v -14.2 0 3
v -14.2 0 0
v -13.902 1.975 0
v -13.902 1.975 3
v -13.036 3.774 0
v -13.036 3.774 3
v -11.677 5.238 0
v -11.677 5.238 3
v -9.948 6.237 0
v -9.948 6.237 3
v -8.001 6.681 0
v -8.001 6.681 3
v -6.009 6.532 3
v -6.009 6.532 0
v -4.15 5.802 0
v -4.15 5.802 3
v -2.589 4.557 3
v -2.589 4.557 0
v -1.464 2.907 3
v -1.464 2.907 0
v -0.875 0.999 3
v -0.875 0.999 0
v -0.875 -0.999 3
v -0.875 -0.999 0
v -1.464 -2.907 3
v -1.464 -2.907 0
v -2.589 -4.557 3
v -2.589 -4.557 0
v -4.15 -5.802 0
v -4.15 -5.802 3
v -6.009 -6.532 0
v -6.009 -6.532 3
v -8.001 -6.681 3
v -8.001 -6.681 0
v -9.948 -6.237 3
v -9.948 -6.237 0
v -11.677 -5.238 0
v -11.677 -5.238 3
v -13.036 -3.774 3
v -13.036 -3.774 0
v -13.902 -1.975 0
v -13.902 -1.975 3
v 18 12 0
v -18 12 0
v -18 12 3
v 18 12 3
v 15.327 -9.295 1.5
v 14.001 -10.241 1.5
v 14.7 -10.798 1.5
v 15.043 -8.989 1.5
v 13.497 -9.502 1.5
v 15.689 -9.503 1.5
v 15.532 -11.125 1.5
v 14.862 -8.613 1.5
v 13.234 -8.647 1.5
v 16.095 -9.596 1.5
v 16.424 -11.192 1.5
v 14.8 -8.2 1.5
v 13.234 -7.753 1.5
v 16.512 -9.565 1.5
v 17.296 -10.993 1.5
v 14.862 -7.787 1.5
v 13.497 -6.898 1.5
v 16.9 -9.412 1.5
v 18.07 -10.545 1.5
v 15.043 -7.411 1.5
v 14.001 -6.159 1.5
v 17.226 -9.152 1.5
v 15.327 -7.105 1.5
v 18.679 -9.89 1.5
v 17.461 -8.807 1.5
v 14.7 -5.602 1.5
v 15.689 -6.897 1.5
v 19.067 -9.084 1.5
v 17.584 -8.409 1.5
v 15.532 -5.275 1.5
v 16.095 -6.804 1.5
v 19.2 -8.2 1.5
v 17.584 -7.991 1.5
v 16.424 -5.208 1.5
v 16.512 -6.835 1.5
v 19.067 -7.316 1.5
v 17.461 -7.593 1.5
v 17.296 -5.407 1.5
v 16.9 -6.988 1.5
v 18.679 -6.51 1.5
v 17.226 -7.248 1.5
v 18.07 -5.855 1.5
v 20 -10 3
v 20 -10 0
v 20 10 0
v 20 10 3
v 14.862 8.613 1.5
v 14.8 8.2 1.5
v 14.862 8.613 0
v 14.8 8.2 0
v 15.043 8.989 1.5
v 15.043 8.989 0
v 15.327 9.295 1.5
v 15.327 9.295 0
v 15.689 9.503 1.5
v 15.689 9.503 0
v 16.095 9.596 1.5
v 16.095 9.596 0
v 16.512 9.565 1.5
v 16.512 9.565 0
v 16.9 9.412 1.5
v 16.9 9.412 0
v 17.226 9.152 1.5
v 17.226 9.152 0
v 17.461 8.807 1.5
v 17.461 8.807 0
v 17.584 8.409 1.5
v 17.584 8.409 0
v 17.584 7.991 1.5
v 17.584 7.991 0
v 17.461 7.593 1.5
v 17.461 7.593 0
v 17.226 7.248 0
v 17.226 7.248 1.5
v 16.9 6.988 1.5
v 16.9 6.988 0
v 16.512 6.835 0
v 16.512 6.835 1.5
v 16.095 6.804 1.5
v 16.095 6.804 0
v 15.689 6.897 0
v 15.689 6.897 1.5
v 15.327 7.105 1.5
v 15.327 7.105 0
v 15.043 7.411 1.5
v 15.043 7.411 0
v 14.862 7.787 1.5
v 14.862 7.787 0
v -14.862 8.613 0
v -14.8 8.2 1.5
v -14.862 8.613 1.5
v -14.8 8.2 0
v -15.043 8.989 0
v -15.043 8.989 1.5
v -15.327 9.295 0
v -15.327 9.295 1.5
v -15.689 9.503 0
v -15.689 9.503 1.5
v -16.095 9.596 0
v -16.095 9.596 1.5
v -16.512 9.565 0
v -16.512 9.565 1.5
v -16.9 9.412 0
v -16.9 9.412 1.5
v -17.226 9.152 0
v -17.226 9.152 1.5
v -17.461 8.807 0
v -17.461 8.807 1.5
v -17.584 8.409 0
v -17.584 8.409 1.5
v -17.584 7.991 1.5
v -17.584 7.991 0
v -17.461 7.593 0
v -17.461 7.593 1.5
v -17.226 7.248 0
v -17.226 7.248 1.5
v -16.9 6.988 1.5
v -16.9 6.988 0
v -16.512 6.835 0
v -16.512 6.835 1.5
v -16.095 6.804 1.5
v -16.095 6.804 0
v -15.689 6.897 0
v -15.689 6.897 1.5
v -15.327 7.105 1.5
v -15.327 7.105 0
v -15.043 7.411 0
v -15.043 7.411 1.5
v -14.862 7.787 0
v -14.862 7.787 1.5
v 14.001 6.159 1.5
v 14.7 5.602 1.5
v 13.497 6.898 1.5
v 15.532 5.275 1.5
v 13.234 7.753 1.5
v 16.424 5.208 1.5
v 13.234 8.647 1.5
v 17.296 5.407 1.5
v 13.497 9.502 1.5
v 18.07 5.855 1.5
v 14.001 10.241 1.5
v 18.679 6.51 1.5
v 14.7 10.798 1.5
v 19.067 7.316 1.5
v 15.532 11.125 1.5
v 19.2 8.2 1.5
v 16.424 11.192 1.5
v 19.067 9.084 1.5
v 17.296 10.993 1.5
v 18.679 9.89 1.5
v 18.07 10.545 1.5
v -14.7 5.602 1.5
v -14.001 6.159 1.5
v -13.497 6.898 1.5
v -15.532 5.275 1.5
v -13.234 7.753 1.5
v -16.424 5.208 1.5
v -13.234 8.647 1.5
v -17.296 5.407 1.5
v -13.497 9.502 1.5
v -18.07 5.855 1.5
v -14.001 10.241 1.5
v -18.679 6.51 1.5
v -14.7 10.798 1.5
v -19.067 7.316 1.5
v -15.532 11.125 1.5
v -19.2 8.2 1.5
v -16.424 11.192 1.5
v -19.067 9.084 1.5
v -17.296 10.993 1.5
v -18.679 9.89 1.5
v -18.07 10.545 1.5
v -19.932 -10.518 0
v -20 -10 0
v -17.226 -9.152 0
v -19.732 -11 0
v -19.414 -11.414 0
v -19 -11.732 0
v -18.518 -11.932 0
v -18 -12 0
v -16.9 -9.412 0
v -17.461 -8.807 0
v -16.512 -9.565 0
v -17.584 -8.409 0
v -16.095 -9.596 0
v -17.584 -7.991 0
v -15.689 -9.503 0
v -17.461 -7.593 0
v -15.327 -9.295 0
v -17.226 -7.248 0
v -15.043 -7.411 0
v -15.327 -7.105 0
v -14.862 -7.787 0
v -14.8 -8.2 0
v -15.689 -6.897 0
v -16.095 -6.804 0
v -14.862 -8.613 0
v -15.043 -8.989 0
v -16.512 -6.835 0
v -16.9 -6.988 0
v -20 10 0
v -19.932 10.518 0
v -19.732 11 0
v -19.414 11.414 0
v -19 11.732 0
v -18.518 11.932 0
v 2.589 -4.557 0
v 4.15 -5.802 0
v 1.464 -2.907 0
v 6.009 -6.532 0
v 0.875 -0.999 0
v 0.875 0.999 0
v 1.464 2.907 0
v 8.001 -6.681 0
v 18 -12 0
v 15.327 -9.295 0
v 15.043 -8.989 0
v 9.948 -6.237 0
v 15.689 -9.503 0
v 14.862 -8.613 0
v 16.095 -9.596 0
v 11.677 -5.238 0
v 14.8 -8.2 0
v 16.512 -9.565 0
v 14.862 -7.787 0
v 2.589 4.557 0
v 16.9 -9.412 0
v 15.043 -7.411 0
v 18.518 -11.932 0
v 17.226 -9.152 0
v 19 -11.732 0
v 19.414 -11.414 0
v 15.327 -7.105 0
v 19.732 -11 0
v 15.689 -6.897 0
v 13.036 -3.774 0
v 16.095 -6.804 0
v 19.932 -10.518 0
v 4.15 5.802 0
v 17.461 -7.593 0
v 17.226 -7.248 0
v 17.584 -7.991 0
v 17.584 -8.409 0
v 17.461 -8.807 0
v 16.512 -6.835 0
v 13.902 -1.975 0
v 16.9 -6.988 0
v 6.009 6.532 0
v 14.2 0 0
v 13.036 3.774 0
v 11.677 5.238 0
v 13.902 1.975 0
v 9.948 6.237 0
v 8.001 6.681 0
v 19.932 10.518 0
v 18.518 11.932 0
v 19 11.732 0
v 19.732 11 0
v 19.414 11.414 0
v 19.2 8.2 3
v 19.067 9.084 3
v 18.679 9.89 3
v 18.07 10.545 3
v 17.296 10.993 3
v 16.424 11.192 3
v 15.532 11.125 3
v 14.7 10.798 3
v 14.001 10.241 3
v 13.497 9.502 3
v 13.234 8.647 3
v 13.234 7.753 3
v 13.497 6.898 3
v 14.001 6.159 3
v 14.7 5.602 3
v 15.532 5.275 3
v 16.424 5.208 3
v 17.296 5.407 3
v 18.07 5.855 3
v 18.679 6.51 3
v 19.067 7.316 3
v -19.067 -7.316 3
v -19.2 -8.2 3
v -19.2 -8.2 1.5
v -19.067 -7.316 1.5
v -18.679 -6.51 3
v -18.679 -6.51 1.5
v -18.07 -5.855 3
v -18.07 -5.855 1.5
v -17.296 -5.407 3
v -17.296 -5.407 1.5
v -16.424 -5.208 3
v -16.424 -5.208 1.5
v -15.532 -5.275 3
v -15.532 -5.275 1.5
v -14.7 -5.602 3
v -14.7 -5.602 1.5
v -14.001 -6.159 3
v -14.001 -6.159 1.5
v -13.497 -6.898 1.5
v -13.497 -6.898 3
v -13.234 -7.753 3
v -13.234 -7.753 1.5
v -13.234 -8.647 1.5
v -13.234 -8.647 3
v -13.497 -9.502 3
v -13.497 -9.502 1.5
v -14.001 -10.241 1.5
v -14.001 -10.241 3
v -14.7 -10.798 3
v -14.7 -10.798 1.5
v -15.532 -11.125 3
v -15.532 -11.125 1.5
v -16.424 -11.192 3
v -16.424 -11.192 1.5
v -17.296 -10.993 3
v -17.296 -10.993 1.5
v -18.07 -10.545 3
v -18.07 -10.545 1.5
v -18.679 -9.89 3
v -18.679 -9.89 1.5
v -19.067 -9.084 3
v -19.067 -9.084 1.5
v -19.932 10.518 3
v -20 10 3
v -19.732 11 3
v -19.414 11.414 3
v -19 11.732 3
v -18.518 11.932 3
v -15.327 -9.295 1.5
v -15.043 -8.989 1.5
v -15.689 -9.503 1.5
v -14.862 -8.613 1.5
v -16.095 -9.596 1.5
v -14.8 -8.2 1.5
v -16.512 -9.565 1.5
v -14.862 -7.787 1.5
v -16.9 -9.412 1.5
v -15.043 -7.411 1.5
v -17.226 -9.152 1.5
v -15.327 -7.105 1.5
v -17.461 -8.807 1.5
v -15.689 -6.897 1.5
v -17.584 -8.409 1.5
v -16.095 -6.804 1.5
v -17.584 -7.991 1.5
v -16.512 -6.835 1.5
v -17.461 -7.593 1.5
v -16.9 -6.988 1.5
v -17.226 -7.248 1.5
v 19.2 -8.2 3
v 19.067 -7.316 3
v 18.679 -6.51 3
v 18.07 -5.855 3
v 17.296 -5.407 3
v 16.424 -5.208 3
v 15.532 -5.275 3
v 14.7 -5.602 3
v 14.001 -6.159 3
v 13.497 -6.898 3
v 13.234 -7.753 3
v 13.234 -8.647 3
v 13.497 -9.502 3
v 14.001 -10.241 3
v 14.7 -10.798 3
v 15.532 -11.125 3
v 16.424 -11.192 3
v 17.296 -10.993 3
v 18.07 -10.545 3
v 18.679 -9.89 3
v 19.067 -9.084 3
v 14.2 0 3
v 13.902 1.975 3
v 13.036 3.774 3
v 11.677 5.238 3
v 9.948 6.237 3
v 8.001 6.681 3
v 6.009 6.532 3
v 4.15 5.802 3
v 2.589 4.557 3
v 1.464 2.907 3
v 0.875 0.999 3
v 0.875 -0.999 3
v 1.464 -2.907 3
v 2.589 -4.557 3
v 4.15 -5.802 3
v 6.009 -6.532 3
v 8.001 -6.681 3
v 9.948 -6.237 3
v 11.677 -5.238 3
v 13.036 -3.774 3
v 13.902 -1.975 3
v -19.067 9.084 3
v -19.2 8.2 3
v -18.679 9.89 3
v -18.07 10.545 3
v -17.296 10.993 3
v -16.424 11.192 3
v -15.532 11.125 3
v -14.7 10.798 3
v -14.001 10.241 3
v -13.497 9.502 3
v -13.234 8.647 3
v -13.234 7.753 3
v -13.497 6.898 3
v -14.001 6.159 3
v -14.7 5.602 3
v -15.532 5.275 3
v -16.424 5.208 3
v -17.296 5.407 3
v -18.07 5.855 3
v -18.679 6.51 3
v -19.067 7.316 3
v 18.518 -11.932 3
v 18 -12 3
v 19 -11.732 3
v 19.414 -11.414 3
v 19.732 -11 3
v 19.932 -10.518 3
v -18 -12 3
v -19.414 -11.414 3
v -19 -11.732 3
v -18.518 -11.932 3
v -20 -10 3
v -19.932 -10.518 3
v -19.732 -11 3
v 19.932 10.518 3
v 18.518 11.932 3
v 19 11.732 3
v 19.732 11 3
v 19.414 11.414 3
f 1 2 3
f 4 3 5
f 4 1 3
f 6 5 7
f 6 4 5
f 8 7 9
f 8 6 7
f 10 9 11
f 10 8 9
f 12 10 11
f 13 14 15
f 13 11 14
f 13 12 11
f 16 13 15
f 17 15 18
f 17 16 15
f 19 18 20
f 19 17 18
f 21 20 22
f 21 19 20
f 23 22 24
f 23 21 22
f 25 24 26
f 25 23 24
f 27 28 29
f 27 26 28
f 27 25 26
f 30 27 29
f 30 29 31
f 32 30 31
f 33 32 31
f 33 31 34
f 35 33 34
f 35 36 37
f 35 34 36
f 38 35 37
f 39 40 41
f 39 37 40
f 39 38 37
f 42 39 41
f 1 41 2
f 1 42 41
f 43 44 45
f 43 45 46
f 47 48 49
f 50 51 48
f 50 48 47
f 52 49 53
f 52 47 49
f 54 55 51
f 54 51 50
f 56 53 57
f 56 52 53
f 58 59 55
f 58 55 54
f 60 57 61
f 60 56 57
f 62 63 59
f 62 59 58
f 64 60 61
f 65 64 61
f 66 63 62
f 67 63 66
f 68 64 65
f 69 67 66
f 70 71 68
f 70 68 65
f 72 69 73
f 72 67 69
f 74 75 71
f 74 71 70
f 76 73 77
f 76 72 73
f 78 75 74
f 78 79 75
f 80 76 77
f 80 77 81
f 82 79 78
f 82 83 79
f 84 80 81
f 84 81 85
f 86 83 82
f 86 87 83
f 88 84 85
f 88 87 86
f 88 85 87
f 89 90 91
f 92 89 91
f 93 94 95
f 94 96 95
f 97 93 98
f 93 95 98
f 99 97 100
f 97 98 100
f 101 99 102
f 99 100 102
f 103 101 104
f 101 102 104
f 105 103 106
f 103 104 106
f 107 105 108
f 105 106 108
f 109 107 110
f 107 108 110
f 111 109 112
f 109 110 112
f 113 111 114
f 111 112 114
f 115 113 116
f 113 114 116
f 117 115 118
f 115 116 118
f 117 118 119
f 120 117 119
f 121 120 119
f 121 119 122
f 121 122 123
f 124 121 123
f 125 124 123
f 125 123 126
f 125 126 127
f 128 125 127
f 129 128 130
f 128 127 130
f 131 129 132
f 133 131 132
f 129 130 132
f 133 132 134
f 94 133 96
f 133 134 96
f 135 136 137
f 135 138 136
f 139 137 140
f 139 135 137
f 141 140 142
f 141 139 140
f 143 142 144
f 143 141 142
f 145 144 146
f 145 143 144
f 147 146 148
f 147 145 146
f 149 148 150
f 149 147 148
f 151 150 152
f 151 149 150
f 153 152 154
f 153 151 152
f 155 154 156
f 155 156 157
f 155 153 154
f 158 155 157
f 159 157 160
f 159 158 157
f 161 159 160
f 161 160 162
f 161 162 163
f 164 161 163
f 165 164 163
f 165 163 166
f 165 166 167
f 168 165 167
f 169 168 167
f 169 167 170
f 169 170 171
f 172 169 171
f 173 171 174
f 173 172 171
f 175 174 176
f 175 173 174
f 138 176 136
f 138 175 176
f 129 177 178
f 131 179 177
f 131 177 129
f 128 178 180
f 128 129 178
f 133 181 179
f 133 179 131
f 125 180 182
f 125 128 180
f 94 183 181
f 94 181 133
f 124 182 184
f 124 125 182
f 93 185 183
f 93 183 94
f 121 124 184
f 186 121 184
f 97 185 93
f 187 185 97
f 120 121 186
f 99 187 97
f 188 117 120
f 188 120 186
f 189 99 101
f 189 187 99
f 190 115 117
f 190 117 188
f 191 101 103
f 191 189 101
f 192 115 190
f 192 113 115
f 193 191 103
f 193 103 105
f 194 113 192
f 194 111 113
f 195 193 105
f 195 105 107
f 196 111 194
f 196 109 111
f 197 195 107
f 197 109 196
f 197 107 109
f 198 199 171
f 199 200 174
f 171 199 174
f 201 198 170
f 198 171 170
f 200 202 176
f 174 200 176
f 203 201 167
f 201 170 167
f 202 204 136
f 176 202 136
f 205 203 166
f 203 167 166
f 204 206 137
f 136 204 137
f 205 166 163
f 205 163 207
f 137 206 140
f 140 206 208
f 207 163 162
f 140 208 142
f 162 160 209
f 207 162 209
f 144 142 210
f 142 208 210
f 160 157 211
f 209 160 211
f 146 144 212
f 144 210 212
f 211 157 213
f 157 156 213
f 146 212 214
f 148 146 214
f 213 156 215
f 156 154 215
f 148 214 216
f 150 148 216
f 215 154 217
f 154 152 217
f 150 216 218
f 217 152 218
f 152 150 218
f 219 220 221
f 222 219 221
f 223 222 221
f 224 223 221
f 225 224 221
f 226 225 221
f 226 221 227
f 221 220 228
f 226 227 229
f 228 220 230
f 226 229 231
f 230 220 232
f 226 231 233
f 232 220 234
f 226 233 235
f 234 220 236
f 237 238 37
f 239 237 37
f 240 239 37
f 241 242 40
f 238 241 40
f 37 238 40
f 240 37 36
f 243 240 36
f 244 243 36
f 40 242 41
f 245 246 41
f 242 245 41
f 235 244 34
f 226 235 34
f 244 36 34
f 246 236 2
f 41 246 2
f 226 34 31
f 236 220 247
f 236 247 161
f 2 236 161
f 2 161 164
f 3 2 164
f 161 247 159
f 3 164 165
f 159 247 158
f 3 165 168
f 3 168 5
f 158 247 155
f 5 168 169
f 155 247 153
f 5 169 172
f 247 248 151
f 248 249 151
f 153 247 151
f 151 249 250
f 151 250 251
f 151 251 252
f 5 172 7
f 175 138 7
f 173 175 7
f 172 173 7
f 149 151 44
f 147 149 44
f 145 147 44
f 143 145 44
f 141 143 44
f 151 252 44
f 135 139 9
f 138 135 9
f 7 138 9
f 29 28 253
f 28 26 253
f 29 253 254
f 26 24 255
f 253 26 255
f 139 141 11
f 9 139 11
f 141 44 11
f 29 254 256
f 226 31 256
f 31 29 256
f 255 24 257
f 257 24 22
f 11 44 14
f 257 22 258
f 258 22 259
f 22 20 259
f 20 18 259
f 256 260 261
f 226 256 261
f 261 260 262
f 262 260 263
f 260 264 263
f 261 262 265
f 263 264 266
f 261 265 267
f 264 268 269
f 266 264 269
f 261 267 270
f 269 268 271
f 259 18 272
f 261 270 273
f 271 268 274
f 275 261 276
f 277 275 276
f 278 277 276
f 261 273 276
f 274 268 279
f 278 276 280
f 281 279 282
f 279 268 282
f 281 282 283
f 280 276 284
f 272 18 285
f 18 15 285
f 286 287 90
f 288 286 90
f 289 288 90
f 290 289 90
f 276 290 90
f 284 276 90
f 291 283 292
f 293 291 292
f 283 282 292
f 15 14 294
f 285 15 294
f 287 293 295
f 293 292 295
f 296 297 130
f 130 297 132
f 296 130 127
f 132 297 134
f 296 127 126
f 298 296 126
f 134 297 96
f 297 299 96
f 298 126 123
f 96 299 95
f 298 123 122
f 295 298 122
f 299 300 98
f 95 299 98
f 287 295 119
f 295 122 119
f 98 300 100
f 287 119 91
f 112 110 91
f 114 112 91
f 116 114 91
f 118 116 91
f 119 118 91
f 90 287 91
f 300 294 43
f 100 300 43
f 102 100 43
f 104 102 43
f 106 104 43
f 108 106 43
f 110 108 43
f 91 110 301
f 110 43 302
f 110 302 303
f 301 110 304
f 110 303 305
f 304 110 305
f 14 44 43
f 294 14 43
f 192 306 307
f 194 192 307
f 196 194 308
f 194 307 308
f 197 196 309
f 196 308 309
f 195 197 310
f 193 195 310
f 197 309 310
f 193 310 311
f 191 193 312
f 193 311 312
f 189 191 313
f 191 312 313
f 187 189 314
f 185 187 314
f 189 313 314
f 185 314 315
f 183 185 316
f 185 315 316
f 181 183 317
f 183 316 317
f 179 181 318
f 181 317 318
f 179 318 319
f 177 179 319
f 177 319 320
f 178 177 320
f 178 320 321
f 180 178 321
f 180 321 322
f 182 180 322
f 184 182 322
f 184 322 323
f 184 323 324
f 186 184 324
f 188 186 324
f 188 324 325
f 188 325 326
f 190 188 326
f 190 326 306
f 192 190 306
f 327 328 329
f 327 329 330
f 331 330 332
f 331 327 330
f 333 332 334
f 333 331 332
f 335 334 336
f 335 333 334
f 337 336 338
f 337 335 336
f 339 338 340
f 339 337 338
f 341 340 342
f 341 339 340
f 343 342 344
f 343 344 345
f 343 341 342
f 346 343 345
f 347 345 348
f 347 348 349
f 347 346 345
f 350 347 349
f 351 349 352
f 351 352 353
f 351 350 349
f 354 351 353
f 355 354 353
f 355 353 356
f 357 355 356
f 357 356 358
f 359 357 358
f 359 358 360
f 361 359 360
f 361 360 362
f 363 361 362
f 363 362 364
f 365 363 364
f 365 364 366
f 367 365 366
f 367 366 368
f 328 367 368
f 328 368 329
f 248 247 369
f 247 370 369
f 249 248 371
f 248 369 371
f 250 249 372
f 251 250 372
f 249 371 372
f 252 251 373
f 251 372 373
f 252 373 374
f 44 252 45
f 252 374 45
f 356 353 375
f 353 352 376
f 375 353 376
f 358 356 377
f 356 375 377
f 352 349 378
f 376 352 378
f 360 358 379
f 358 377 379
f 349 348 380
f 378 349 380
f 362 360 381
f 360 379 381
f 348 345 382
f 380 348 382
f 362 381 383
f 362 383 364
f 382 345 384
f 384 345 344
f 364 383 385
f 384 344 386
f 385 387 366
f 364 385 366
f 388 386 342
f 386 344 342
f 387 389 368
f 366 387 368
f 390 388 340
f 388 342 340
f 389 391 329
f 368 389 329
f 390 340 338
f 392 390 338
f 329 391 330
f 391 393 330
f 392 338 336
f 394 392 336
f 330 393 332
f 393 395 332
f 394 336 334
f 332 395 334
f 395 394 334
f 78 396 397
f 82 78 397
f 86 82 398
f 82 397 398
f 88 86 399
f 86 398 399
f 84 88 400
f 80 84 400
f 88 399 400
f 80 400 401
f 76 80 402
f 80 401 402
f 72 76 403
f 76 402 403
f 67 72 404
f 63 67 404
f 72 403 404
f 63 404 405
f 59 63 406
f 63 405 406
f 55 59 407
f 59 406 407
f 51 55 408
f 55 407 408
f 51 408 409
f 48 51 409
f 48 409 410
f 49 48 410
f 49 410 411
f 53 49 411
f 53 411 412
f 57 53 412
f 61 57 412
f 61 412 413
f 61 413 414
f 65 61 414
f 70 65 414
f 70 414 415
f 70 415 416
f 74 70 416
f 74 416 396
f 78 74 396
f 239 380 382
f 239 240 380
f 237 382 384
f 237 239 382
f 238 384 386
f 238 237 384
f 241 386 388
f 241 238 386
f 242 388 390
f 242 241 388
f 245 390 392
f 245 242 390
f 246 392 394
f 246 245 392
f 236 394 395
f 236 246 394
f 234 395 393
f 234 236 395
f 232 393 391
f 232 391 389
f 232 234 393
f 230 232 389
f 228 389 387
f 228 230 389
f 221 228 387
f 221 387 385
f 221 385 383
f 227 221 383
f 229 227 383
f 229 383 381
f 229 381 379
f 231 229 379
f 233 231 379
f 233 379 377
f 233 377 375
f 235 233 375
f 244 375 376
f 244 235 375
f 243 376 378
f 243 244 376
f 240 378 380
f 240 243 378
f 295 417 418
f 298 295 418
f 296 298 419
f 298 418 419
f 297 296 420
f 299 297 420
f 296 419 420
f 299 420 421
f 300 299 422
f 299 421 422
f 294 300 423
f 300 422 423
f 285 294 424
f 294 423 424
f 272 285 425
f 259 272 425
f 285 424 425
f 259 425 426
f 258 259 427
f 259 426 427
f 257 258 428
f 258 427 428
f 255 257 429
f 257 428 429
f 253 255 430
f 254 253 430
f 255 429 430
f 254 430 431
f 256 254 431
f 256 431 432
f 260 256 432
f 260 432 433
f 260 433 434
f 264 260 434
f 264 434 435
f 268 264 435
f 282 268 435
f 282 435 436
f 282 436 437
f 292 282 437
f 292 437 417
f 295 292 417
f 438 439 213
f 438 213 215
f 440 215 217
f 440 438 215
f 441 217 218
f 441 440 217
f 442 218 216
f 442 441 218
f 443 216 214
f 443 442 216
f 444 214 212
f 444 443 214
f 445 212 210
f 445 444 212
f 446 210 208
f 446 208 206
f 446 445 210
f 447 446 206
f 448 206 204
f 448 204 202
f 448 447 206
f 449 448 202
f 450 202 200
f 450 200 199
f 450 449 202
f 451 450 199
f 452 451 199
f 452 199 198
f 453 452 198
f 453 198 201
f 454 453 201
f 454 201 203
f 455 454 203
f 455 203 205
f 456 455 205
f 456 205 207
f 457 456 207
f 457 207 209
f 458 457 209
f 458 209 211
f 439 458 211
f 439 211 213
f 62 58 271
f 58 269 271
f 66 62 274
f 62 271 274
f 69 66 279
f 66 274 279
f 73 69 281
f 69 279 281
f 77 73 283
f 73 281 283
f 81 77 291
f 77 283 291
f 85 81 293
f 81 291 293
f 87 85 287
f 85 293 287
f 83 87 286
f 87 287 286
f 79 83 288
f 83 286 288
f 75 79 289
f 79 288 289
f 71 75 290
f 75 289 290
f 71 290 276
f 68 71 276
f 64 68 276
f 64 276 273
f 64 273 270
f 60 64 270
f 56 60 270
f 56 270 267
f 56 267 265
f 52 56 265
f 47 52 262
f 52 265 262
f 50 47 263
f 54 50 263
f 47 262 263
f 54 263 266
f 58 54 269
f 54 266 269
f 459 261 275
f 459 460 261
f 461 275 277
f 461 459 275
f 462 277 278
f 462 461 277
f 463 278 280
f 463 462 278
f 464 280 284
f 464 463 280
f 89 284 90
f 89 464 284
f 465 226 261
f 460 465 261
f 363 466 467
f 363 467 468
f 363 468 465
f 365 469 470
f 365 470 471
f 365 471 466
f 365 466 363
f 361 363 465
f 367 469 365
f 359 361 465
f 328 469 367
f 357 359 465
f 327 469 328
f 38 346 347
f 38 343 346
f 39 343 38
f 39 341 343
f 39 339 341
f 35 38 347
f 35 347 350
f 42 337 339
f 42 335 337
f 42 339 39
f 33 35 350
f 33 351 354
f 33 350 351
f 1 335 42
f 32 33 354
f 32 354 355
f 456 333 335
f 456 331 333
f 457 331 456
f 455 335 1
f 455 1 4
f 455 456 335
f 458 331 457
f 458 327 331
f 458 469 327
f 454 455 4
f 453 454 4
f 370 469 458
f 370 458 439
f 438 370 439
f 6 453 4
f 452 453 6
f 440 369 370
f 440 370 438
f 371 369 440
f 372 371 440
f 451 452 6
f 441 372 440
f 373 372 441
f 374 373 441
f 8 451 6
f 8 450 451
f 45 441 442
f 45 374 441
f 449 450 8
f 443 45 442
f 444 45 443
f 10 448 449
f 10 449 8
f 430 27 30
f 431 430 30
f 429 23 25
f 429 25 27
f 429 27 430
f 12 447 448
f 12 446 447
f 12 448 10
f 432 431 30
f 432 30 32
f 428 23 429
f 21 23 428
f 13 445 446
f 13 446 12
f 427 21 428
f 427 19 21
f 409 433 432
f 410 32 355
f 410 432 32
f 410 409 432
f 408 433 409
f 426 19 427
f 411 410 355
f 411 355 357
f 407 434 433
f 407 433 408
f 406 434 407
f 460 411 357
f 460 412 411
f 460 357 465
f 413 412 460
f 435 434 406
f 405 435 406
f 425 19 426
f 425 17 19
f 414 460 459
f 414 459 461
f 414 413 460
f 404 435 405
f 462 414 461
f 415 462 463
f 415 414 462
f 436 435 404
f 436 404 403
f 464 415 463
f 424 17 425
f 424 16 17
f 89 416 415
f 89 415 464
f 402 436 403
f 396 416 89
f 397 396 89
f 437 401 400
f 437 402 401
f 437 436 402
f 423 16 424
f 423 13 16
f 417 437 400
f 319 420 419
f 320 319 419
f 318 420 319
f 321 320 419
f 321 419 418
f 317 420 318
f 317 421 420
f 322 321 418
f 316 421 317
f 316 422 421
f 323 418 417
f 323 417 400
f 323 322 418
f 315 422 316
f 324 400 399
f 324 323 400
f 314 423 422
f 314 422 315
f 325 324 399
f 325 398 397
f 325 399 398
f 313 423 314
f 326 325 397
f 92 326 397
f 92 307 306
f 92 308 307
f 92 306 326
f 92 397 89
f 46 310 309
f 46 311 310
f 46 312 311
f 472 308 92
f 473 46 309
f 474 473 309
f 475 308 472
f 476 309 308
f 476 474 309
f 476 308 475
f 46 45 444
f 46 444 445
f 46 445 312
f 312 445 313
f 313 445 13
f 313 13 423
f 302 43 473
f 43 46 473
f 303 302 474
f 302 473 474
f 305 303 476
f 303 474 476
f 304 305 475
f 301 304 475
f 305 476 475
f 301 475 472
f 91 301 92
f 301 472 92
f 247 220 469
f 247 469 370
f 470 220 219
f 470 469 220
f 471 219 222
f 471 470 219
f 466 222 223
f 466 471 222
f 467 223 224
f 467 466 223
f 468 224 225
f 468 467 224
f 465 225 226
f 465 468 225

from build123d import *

# Parameters (mm, degrees)
SKETCH048_W         = 40
SKETCH048_H         = 24
PAD013_DEPTH        = 3
HOLE020_D           = 2.8
HOLE020_DEPTH       = 25
HOLE020_CBORE_D     = 6
HOLE020_CBORE_DEPTH = 1.5
SKETCH050_R         = 6.7
HOLE021_DEPTH       = 25
FILLET025_R         = 2


with BuildPart() as part:
    # Sketch048 → Pad013 (new body)
    with BuildSketch(Plane.XY):
        Rectangle(SKETCH048_W, SKETCH048_H)
    extrude(amount=PAD013_DEPTH)

    # Hole020
    with Locations(Plane.XY.offset(3)):
        with Locations((16.2, 8.2), (16.2, -8.2)):
            hole020 = CounterBoreHole(HOLE020_D / 2, HOLE020_CBORE_D / 2, HOLE020_CBORE_DEPTH, depth=HOLE020_DEPTH)

    # Mirrored023: Hole020 across Sketch049 V_Axis
    add(hole020.mirror(Plane(origin=(0, 0, 3), x_dir=(0, 0, 1), z_dir=(1, 0, 0))), mode=Mode.SUBTRACT)

    # Sketch050 (on Face5 of Mirrored023) → Hole021 (cut)
    with BuildSketch(Plane.XY.offset(3)):
        with Locations((7.5, 0)):
            Circle(SKETCH050_R)
    hole021 = extrude(amount=-HOLE021_DEPTH, mode=Mode.SUBTRACT)

    # Mirrored024: Hole021 across Sketch050 V_Axis
    add(hole021.mirror(Plane(origin=(0, 0, 3), x_dir=(0, 0, 1), z_dir=(1, 0, 0))), mode=Mode.SUBTRACT)

    # Fillet025
    fillet025_edges = [part.edges().sort_by_distance(p)[0] for p in [
        (20, 12, 1.5),
        (-20, 12, 1.5),
        (-20, -12, 1.5),
        (20, -12, 1.5),
    ]]
    fillet(fillet025_edges, radius=FILLET025_R)


solid = part.part
